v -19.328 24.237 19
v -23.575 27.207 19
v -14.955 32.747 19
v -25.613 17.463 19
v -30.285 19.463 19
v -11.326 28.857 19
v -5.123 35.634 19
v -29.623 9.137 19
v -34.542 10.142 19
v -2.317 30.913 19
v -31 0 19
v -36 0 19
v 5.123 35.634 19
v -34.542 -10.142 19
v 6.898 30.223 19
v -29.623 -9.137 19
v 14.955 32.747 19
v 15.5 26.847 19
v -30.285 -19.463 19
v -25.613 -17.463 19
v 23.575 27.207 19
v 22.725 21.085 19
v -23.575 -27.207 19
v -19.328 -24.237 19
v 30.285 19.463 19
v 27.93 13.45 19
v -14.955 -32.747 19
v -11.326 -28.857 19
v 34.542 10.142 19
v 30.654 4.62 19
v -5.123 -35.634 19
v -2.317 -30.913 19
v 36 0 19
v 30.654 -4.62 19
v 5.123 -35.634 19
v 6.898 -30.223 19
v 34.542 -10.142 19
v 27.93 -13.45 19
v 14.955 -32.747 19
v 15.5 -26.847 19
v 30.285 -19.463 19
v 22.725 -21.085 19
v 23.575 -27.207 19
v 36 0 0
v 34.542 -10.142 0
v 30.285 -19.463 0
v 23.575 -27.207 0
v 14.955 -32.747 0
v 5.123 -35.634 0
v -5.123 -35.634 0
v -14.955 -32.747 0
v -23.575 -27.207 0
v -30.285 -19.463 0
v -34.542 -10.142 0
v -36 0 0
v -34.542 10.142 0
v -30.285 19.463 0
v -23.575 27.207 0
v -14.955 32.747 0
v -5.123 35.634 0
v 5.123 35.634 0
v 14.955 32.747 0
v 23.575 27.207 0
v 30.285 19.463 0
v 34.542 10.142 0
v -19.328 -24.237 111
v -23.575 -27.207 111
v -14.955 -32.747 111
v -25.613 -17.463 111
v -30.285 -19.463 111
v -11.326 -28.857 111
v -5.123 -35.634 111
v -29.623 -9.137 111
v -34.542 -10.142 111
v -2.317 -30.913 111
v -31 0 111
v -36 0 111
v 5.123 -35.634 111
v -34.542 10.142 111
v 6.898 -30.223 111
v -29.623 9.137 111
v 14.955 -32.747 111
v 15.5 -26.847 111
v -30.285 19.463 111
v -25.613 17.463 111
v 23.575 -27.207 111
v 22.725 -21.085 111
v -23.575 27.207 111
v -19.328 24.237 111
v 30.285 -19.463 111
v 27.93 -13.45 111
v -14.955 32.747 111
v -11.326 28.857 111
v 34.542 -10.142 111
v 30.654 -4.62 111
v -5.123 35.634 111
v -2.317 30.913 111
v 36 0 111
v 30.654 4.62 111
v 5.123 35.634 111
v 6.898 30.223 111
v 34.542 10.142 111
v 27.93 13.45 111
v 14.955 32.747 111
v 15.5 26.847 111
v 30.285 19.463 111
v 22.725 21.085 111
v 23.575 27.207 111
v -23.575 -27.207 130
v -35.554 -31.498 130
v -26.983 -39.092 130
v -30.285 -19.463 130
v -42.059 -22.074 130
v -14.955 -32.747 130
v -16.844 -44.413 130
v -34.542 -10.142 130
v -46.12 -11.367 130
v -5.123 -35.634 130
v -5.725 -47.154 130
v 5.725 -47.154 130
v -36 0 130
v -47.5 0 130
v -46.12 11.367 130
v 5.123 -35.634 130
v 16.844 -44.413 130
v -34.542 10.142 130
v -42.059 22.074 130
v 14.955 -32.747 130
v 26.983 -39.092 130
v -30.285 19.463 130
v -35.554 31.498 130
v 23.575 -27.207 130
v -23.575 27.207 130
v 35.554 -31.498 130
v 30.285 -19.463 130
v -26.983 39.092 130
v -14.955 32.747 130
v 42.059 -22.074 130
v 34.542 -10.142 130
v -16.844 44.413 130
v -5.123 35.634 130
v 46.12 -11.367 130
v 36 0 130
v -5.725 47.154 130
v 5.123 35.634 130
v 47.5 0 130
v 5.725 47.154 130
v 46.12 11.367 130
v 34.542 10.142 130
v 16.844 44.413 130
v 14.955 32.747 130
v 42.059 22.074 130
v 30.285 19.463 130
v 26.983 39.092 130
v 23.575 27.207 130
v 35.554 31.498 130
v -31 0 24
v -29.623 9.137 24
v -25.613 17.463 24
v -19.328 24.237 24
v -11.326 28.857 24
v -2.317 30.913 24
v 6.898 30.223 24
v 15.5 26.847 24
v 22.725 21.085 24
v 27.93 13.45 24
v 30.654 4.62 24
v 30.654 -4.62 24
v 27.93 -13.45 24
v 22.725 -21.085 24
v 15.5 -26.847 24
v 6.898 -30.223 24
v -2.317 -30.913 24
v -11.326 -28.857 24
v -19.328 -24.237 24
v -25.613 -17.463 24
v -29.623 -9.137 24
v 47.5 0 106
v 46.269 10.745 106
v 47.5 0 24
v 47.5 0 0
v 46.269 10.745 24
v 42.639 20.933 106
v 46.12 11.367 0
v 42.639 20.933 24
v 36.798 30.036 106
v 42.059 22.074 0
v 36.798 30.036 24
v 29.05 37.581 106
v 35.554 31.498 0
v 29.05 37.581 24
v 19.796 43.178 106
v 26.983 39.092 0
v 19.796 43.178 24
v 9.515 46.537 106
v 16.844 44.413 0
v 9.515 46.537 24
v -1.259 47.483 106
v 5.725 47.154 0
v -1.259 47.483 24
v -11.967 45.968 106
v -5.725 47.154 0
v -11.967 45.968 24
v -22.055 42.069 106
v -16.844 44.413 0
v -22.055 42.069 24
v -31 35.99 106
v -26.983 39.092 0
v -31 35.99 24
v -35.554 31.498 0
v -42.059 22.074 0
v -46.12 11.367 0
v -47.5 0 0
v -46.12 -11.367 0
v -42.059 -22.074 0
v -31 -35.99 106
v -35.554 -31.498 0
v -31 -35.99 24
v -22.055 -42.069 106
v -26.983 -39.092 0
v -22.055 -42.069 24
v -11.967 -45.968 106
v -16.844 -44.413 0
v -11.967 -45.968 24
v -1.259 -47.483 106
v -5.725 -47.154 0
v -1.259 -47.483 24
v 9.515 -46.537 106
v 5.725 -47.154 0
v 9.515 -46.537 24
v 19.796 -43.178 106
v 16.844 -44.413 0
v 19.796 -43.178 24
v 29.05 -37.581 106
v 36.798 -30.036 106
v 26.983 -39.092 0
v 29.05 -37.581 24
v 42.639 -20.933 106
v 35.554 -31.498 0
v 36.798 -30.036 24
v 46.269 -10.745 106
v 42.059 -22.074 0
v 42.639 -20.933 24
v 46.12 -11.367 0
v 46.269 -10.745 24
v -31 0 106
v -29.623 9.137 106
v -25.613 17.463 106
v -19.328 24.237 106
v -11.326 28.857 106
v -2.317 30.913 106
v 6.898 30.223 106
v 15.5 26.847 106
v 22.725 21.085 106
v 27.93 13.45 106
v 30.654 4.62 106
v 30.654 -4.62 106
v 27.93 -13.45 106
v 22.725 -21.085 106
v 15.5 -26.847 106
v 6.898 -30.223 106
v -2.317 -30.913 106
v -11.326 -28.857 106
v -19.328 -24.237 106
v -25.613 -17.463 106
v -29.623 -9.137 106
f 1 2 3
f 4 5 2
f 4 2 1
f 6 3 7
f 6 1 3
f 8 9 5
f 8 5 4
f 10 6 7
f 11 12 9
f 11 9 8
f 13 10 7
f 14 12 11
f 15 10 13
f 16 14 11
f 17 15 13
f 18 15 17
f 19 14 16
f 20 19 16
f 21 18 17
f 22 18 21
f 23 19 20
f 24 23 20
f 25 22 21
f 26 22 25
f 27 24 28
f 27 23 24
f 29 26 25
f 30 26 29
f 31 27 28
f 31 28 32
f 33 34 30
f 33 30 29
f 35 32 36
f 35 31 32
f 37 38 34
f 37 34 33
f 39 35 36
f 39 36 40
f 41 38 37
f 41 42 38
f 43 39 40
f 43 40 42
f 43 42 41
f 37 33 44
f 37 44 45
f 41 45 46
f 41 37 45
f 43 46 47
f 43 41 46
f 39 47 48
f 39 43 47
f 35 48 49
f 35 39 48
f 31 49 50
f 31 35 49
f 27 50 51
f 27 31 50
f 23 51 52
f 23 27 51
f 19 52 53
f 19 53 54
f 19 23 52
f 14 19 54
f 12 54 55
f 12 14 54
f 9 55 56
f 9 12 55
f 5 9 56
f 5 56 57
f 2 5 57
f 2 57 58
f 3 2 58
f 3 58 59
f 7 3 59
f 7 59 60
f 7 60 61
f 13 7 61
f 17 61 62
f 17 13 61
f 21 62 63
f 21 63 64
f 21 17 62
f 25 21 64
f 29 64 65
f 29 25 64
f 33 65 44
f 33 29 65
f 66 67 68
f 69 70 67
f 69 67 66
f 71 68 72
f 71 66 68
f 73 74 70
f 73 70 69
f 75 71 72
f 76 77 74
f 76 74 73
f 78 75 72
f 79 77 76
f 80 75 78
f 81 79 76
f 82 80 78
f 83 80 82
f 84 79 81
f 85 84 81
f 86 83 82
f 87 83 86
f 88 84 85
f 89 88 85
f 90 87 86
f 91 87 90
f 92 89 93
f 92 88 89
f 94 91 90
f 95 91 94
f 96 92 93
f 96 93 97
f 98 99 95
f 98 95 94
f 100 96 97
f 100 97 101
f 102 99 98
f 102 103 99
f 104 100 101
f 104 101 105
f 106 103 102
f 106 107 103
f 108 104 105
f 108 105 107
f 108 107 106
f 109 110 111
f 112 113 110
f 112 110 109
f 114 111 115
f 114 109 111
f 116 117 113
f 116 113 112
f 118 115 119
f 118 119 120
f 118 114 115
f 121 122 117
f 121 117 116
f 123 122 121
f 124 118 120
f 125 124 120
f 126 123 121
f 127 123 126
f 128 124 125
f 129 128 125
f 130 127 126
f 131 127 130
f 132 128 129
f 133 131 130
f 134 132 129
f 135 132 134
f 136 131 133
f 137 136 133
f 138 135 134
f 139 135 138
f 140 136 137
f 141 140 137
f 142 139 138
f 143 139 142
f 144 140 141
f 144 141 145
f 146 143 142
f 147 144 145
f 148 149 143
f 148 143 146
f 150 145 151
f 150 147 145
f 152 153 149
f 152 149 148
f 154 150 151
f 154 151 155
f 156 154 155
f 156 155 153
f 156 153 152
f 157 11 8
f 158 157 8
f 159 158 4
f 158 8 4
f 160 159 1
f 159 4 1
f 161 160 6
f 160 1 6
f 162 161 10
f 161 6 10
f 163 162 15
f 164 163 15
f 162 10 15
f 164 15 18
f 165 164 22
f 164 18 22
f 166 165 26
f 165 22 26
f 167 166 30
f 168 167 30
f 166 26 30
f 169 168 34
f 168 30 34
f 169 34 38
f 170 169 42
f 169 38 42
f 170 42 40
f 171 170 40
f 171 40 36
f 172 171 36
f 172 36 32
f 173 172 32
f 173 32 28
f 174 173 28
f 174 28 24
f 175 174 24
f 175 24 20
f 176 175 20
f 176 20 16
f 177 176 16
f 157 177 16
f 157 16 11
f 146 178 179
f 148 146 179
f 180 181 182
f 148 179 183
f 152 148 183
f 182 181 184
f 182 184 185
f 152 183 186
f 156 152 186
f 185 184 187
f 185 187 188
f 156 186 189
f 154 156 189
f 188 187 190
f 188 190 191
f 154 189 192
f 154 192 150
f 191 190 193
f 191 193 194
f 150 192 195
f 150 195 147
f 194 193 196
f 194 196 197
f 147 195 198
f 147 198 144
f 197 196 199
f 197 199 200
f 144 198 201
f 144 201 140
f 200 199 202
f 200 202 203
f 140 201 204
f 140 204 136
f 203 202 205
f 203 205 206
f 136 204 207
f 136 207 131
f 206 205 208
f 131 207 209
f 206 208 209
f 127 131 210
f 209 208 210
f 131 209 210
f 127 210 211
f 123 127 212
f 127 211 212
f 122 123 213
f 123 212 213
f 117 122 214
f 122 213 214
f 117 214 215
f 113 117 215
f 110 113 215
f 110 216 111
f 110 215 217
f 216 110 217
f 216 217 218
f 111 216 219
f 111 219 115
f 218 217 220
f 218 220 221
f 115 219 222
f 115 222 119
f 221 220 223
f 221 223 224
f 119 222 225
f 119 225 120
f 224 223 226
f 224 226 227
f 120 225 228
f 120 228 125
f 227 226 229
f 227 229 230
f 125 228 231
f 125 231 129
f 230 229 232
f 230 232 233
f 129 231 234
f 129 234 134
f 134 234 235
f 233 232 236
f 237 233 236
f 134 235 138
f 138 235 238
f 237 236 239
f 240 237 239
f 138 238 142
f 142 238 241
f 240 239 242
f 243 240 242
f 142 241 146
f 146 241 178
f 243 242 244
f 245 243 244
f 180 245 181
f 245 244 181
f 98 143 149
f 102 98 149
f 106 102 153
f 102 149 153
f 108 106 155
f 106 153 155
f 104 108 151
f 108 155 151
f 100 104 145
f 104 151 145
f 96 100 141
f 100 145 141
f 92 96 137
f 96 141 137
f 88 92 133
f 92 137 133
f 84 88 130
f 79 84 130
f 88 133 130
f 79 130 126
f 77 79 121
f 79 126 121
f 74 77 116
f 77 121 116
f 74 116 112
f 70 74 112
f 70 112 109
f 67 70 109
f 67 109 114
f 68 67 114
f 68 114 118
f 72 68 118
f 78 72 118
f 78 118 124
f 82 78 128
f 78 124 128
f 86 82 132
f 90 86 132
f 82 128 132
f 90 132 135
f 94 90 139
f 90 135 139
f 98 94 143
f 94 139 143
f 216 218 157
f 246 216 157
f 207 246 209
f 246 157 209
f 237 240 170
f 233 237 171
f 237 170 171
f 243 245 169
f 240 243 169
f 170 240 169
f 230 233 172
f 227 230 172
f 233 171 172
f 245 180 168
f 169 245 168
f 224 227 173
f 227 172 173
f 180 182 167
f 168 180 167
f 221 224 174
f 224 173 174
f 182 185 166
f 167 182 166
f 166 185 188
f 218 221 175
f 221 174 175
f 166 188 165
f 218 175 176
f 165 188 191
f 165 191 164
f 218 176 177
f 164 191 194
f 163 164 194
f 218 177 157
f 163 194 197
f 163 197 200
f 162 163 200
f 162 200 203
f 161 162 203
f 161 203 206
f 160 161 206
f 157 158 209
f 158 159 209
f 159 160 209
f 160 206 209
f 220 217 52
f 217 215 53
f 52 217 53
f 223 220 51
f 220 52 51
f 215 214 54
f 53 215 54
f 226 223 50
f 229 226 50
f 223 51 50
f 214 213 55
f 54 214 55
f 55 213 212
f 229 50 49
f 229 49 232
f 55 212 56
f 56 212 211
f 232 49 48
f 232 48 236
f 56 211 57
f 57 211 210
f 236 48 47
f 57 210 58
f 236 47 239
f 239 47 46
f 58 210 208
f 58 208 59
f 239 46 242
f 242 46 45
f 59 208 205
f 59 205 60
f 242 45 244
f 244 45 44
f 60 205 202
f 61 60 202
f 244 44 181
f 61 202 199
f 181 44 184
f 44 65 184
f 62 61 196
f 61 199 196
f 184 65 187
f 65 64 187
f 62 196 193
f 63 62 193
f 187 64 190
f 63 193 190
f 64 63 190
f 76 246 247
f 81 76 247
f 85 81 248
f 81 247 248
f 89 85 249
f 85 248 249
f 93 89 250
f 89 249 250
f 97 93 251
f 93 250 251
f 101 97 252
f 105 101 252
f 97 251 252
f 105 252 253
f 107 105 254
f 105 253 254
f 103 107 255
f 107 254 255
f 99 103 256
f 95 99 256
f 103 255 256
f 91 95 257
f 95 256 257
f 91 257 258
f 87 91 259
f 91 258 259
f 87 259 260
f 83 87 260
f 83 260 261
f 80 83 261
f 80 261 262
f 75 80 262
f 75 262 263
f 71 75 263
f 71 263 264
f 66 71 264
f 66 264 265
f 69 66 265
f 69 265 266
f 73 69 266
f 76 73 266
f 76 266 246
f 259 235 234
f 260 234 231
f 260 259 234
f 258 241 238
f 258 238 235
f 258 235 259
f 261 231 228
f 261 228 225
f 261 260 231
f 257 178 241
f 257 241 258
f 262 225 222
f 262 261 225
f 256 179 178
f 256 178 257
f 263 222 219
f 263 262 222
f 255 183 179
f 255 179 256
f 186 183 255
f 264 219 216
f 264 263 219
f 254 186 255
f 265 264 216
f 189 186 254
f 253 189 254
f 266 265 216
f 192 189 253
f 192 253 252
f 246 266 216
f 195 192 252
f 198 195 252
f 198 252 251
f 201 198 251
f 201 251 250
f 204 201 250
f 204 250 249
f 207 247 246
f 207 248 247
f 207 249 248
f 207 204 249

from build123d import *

# Parameters (mm, degrees)
SKETCH_1_R          = 47.5
EXTRUDE_1_DEPTH     = 130
SKETCH_2_R          = 36
CUT_EXTRUDE_1_DEPTH = 19
CUT_EXTRUDE_START   = -19
SKETCH_3_R          = 36
CUT_EXTRUDE_2_DEPTH = 19
SKETCH_4_R          = 31
CUT_EXTRUDE_3_DEPTH = 139
CUT_EXTRUDE_4_DEPTH = 82


with BuildPart() as part:
    # 草图1 → 拉伸1 (new body)
    with BuildSketch(Plane.XY):
        Circle(SKETCH_1_R)
    extrude(amount=EXTRUDE_1_DEPTH)

    # 草图2 → 切除-拉伸1 (cut)
    with BuildSketch(Plane.XY.offset(130)):
        Circle(SKETCH_2_R)
    extrude(amount=-CUT_EXTRUDE_1_DEPTH, mode=Mode.SUBTRACT)

    # 草图3 → 切除-拉伸2 (cut)
    with BuildSketch(Plane(origin=(0, 0, 0), x_dir=(-1, 0, 0), z_dir=(0, 0, -1)).offset(CUT_EXTRUDE_START)):
        with Locations(Location((0, 0, 0), (0, 0, 180))):
            Circle(SKETCH_3_R)
    extrude(amount=CUT_EXTRUDE_2_DEPTH, mode=Mode.SUBTRACT)

    # 草图4 → 切除-拉伸3 (cut)
    with BuildSketch(Plane(origin=(0, 0, 19), x_dir=(-1, 0, 0), z_dir=(0, 0, -1))):
        Circle(SKETCH_4_R)
    extrude(amount=-CUT_EXTRUDE_3_DEPTH, mode=Mode.SUBTRACT)

    # 草图5 → 切除-拉伸4 (cut)
    with BuildSketch(Plane(origin=(0, 0, 24), x_dir=(-1, 0, 0), z_dir=(0, 0, -1))):
        with BuildLine():
            Line((31, -35.989581826), (31, 35.989581826))
            ThreePointArc((31, 35.989581826), (-47.5, 0), (31, -35.989581826))
        make_face()
    extrude(amount=-CUT_EXTRUDE_4_DEPTH, mode=Mode.SUBTRACT)


solid = part.part
